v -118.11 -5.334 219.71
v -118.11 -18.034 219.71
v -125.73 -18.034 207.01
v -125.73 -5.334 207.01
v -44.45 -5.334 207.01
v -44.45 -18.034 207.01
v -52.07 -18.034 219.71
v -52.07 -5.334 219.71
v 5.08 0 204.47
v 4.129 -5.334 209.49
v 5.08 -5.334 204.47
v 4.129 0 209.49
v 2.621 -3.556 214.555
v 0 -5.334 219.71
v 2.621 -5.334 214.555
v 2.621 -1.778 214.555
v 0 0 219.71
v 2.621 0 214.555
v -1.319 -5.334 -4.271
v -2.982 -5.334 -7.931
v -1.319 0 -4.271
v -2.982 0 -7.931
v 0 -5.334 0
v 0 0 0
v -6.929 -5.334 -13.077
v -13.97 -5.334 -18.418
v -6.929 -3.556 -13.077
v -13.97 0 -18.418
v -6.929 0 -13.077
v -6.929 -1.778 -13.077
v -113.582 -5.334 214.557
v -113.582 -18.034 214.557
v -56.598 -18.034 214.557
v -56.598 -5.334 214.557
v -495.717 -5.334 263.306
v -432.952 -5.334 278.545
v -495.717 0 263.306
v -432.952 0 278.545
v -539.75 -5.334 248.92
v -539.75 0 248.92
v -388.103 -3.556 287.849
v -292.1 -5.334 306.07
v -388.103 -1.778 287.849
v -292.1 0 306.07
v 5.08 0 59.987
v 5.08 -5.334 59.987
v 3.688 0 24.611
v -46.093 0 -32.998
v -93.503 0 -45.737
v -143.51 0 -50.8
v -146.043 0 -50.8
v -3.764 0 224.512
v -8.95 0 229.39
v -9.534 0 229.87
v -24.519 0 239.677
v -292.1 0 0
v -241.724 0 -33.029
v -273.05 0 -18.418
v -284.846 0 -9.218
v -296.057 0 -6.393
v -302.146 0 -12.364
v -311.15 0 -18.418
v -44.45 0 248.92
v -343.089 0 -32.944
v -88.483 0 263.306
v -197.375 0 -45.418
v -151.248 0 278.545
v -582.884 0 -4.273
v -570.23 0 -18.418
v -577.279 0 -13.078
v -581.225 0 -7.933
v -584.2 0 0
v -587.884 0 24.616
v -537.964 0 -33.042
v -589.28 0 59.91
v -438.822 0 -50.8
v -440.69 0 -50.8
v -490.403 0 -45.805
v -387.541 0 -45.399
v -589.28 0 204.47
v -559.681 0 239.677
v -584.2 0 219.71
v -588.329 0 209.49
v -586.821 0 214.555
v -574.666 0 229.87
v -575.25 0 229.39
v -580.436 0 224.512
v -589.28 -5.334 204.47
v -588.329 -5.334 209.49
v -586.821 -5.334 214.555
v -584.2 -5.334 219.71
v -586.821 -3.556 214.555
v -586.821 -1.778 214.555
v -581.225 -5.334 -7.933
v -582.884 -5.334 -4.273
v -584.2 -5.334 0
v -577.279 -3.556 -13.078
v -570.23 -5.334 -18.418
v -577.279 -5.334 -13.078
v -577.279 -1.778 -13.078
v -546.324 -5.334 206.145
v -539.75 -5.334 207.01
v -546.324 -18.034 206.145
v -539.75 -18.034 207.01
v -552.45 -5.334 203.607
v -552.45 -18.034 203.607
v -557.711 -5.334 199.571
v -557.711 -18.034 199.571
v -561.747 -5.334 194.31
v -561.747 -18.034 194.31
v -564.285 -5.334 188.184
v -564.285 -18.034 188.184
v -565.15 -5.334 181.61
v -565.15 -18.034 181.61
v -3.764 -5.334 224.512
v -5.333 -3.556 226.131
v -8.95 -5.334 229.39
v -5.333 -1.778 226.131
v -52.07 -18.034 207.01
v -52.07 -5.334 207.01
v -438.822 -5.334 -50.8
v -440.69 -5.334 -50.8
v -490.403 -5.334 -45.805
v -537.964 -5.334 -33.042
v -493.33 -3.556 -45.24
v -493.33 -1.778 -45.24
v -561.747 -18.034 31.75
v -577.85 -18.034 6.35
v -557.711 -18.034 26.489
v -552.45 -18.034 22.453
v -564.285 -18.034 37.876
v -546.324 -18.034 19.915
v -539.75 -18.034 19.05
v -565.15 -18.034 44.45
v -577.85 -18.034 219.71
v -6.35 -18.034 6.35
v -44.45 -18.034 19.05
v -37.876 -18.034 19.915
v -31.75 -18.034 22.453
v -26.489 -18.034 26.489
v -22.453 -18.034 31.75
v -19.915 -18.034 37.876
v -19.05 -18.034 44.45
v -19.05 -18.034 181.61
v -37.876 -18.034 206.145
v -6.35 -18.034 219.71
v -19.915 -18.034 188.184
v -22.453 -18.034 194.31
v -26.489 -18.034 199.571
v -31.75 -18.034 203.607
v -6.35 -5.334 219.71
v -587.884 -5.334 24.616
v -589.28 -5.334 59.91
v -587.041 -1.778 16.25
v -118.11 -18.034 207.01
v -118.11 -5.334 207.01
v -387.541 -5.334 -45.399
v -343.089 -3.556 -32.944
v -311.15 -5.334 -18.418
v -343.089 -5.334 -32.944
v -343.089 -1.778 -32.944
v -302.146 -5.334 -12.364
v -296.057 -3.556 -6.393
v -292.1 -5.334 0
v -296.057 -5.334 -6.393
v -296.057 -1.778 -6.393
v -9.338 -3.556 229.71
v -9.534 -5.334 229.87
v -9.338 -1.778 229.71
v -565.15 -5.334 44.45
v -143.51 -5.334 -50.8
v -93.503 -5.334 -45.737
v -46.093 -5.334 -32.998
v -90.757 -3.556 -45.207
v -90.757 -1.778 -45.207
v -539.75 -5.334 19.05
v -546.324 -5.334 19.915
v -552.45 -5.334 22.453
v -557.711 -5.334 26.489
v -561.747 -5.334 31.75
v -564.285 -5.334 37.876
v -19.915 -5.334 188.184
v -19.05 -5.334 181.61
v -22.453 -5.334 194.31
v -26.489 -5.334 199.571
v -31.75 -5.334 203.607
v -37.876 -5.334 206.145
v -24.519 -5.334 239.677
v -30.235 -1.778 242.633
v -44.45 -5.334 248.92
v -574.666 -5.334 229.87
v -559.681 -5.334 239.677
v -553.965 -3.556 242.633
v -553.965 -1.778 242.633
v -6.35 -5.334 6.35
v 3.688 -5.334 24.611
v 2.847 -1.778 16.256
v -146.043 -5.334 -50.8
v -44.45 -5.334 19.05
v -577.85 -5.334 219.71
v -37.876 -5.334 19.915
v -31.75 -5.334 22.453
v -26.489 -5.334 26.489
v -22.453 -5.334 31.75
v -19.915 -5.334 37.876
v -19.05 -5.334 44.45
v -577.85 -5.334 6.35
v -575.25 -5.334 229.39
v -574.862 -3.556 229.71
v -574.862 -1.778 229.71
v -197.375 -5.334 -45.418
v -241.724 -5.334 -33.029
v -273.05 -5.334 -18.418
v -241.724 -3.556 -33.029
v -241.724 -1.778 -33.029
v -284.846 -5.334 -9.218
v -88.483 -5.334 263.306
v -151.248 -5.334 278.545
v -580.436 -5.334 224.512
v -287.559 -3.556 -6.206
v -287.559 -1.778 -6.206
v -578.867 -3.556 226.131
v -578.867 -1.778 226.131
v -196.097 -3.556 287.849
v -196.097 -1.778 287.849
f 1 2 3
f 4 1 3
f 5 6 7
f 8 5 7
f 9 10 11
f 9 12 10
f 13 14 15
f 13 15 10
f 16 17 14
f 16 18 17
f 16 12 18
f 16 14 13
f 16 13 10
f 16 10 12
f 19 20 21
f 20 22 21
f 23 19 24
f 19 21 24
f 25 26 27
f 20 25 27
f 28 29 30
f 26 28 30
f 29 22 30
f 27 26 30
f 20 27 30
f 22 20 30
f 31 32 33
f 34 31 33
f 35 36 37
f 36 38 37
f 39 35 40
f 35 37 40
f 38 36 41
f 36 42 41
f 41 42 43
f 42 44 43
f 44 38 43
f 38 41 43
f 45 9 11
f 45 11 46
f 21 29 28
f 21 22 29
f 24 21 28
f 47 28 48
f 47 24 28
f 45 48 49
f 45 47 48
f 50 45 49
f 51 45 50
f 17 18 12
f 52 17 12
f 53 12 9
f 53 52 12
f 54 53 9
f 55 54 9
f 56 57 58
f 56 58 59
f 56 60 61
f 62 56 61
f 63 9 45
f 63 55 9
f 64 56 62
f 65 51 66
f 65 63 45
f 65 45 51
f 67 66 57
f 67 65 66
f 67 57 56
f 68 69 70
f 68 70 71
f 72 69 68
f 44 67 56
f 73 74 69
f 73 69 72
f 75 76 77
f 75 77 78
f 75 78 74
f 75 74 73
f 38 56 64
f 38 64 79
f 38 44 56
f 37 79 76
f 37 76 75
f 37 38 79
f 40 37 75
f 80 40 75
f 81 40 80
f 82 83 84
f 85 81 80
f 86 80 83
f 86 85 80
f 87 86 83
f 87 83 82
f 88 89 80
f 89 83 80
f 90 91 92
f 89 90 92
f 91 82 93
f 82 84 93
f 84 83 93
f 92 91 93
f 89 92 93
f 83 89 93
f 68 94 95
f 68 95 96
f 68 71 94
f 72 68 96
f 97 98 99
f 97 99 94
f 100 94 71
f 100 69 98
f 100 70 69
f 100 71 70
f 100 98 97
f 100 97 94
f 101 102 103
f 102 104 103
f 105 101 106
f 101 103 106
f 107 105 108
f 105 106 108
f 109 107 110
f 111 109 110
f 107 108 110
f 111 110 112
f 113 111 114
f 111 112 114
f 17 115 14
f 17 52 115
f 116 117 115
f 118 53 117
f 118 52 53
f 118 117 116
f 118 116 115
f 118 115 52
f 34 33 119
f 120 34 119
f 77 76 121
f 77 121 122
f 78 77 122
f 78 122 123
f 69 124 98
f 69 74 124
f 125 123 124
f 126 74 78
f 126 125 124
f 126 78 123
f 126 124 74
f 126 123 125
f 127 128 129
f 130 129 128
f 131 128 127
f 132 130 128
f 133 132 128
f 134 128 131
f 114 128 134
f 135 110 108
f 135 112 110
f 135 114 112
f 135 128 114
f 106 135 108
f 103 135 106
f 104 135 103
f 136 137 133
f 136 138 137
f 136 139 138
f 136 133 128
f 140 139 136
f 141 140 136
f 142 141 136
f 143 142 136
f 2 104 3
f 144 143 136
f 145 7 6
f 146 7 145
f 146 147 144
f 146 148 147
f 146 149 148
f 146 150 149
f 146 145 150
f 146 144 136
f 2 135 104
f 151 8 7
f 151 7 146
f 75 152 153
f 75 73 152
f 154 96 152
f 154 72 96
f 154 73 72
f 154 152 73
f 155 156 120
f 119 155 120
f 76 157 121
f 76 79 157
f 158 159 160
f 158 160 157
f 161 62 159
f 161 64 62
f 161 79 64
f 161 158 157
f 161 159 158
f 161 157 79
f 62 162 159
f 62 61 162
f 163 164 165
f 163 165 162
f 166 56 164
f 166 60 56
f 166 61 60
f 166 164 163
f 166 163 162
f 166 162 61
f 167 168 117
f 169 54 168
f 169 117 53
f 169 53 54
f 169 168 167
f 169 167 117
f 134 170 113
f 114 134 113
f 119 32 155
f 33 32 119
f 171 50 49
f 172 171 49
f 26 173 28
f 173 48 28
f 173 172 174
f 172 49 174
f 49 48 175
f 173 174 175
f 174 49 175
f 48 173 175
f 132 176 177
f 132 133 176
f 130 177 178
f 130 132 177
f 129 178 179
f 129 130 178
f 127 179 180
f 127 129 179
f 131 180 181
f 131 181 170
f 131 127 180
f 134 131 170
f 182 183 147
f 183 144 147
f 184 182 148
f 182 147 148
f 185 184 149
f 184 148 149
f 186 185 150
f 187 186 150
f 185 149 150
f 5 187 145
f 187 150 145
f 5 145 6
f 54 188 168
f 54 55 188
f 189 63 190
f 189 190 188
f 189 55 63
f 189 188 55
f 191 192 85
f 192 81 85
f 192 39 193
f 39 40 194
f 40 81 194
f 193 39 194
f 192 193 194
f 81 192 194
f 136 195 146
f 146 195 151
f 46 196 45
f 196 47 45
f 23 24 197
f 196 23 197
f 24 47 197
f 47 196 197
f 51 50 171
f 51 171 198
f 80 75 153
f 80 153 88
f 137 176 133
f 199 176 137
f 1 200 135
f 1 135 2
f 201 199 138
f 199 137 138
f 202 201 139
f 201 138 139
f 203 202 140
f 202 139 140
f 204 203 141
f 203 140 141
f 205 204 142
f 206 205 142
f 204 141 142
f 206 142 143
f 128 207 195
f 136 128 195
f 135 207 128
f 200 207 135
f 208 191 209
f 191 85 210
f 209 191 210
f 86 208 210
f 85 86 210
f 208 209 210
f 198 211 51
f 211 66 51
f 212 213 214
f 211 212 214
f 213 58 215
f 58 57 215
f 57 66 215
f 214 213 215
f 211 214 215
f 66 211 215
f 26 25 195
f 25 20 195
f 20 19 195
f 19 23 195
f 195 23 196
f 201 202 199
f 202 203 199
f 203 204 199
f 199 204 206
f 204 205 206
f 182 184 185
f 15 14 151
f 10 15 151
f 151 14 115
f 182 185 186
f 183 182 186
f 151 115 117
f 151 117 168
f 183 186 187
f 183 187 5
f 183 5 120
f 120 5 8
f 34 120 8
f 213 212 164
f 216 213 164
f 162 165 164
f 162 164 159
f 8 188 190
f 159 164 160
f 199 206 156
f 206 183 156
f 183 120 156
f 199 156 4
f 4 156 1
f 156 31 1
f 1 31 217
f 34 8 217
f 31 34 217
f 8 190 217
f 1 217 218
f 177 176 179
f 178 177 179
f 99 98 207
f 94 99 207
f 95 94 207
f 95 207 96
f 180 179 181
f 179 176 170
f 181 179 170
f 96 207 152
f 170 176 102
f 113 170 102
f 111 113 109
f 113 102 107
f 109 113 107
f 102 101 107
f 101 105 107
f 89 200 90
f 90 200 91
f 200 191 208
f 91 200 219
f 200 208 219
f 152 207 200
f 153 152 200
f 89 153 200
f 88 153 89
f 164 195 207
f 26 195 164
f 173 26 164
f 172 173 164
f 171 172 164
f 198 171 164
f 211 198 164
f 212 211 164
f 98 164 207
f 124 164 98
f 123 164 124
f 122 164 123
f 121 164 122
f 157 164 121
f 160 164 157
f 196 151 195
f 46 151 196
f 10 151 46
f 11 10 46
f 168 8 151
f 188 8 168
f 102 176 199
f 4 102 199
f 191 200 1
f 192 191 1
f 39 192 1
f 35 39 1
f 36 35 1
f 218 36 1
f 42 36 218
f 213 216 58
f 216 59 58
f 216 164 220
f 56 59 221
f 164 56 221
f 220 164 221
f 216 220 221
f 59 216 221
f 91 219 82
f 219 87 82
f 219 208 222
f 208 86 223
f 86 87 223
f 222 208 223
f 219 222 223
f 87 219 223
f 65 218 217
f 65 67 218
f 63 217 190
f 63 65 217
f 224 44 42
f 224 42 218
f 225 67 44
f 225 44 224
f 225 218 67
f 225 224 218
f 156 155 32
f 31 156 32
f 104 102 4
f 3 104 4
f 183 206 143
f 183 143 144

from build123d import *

# Parameters (mm, degrees)
F0_W     = 584.2
F0_H     = 219.71
F1_DEPTH = 5.334
F2_W     = 571.5
F2_H     = 213.36
F2_W_2   = 546.1
F2_H_2   = 187.96
F3_DEPTH = 12.7
F4_R     = 25.4
F6_DEPTH = 12.7
F8_DEPTH = 5.334


# Not quite as in the source:
# - a feature names something its author has since deleted; it is built from what else it names


with BuildPart() as f1:
    # F0 (on Front) → F1 (new body)
    with BuildSketch(Plane.XZ):
        with Locations((-292.1, 109.855)):
            Rectangle(F0_W, F0_H)
    extrude(amount=F1_DEPTH)

    # F2 (on face) → F3 (join)
    with BuildSketch(Plane.XZ.offset(5.334)):
        with Locations((-292.1, 113.03)):
            Rectangle(F2_W, F2_H)
        with Locations((-292.1, 113.03)):
            Rectangle(F2_W_2, F2_H_2, mode=Mode.SUBTRACT)
    extrude(amount=F3_DEPTH)

    # F4
    f4_edges = [f1.edges().sort_by_distance(p)[0] for p in [
        (-565.15, -11.684, 207.01),
        (-19.05, -11.684, 207.01),
        (-19.05, -11.684, 19.05),
        (-565.15, -11.684, 19.05),
    ]]
    fillet(f4_edges, radius=F4_R)

    # F5 (on face) → F6 (cut)
    with BuildSketch(Plane.XZ.offset(18.034)):
        Polygon((-118.11, 219.71), (-125.73, 207.01), (-118.11, 207.01), (-113.5820166854, 214.5566388576), (-110.49, 219.71), align=None)
        Polygon((-56.5979833146, 214.5566388576), (-52.07, 207.01), (-44.45, 207.01), (-52.07, 219.71), (-59.69, 219.71), align=None)
        Polygon((-59.69, 219.71), (-110.49, 219.71), (-113.5820166854, 214.5566388576), (-56.5979833146, 214.5566388576), align=None)
    extrude(amount=-F6_DEPTH, mode=Mode.SUBTRACT)

    # F7 (on face) → F8 (join)
    with BuildSketch(Plane(origin=(0, 0, 0), x_dir=(-1, 0, 0), z_dir=(0, 1, 0))):
        with BuildLine():
            Line((292.1, 0), (0, 0))
            add(Edge.make_bspline(
                [(13.97, -18.4182160117), (5.1776683434, -12.9300591082), (2.1993531585, -8.4306227348), (0, 0)],
                knots=[0.6884256157, 0.6884256157, 0.6884256157, 0.6884256157, 0.8055577438, 0.8055577438, 0.8055577438, 0.8055577438], degree=3))
            Line((13.97, -18.4182160117), (273.05, -18.4182160117))
            add(Edge.make_bspline(
                [(292.1, 0), (287.8348745006, -6.4171904537), (283.3704909948, -12.0241872437), (273.05, -18.4182160117)],
                knots=[0, 0, 0, 0, 0.1254053332, 0.1254053332, 0.1254053332, 0.1254053332], degree=3))
        make_face()
        with BuildLine():
            add(Edge.make_bspline(
                [(0, 0), (-3.4777348873, 13.330951736), (-5.0077822241, 36.49129499), (-5.08, 59.9872617497)],
                knots=[0.8055577438, 0.8055577438, 0.8055577438, 0.8055577438, 0.9907733318, 0.9907733318, 0.9907733318, 0.9907733318], degree=3))
            Line((0, 0), (0, 109.855))
            Line((0, 109.855), (-5.08, 109.855))
            Line((-5.08, 109.855), (-5.08, 63.5))
            Line((-5.08, 63.5), (-5.08, 59.9872617497))
        make_face()
        with BuildLine():
            Line((273.05, -18.4182160117), (13.97, -18.4182160117))
            add(Edge.make_bspline(
                [(143.51, -50.8), (89.8146392781, -50.5091658601), (35.101098408, -31.6082079428), (13.97, -18.4182160117)],
                knots=[0.4069154744, 0.4069154744, 0.4069154744, 0.4069154744, 0.6884256157, 0.6884256157, 0.6884256157, 0.6884256157], degree=3))
            Line((143.51, -50.8), (146.0426574413, -50.8))
            add(Edge.make_bspline(
                [(273.05, -18.4182160117), (250.2469136161, -32.545798741), (198.8550496381, -50.5155722463), (146.0426574413, -50.8)],
                knots=[0.1254053332, 0.1254053332, 0.1254053332, 0.1254053332, 0.4024879494, 0.4024879494, 0.4024879494, 0.4024879494], degree=3))
        make_face()
        with BuildLine():
            Line((584.2, 0), (292.1, 0))
            add(Edge.make_bspline(
                [(292.1, 0), (295.2511238563, -6.7739107165), (300.4280406329, -12.1526213408), (311.15, -18.4182160117)],
                knots=[0, 0, 0, 0, 0.1254053332, 0.1254053332, 0.1254053332, 0.1254053332], degree=3))
            Line((311.15, -18.4182160117), (570.23, -18.4182160117))
            add(Edge.make_bspline(
                [(570.23, -18.4182160117), (579.0383616328, -12.9277742975), (582.0053728244, -8.4368679309), (584.2, 0)],
                knots=[0.6884256157, 0.6884256157, 0.6884256157, 0.6884256157, 0.8055577438, 0.8055577438, 0.8055577438, 0.8055577438], degree=3))
        make_face()
        with BuildLine():
            Line((-5.08, 109.855), (0, 109.855))
            Line((0, 109.855), (0, 219.71))
            add(Edge.make_bspline(
                [(0, 219.71), (-3.3633398359, 214.4958413315), (-4.221669918, 209.4829206658), (-5.08, 204.47)],
                knots=[0.8528806378, 0.8528806378, 0.8528806378, 0.8528806378, 1, 1, 1, 1], degree=3))
            Line((-5.08, 204.47), (-5.08, 109.855))
        make_face()
        with BuildLine():
            Line((570.23, -18.4182160117), (311.15, -18.4182160117))
            add(Edge.make_bspline(
                [(311.15, -18.4182160117), (334.9383025593, -32.3193936455), (386.0216290424, -50.5861863086), (438.8223695347, -50.8)],
                knots=[0.1254053332, 0.1254053332, 0.1254053332, 0.1254053332, 0.4036361962, 0.4036361962, 0.4036361962, 0.4036361962], degree=3))
            Line((438.8223695347, -50.8), (440.69, -50.8))
            add(Edge.make_bspline(
                [(440.69, -50.8), (494.1504250391, -50.5826159423), (549.0603758608, -31.6136991551), (570.23, -18.4182160117)],
                knots=[0.4069154744, 0.4069154744, 0.4069154744, 0.4069154744, 0.6884256157, 0.6884256157, 0.6884256157, 0.6884256157], degree=3))
        make_face()
        with BuildLine():
            Line((584.2, 109.855), (584.2, 0))
            add(Edge.make_bspline(
                [(584.2, 0), (587.6660611317, 13.3246778013), (589.2055548561, 36.4918183962), (589.28, 59.9101174948)],
                knots=[0.8055577438, 0.8055577438, 0.8055577438, 0.8055577438, 0.9905491269, 0.9905491269, 0.9905491269, 0.9905491269], degree=3))
            Line((589.28, 59.9101174948), (589.28, 63.5))
            Line((589.28, 63.5), (589.28, 109.855))
            Line((589.28, 109.855), (584.2, 109.855))
        make_face()
        with BuildLine():
            add(Edge.make_bspline(
                [(8.9497229668, 229.3903513516), (5.0117556013, 226.1203537614), (2.0435071593, 222.8780326962), (0, 219.71)],
                knots=[0.7634934559, 0.7634934559, 0.7634934559, 0.7634934559, 0.8528806378, 0.8528806378, 0.8528806378, 0.8528806378], degree=3))
            Line((0, 219.71), (292.1, 219.71))
            Line((292.1, 219.71), (8.9497229668, 229.3903513516))
        make_face()
        with BuildLine():
            Line((584.2, 219.71), (584.2, 109.855))
            Line((584.2, 109.855), (589.28, 109.855))
            Line((589.28, 109.855), (589.28, 204.47))
            add(Edge.make_bspline(
                [(584.2, 219.71), (587.5633398359, 214.4958413315), (588.421669918, 209.4829206658), (589.28, 204.47)],
                knots=[0.8528806378, 0.8528806378, 0.8528806378, 0.8528806378, 1, 1, 1, 1], degree=3))
        make_face()
        with BuildLine():
            add(Edge.make_bspline(
                [(9.5340725562, 229.87), (9.3369695017, 229.7100546344), (9.1421880555, 229.5501699377), (8.9497229668, 229.3903513516)],
                knots=[0.759124727, 0.759124727, 0.759124727, 0.759124727, 0.7634934559, 0.7634934559, 0.7634934559, 0.7634934559], degree=3))
            Line((8.9497229668, 229.3903513516), (292.1, 219.71))
            Line((292.1, 219.71), (575.2502770332, 229.3903513516))
            add(Edge.make_bspline(
                [(574.6659274438, 229.87), (574.8630304983, 229.7100546344), (575.0578119445, 229.5501699377), (575.2502770332, 229.3903513516)],
                knots=[0.759124727, 0.759124727, 0.759124727, 0.759124727, 0.7634934559, 0.7634934559, 0.7634934559, 0.7634934559], degree=3))
            Line((574.6659274438, 229.87), (539.75, 229.87))
            Line((539.75, 229.87), (292.1, 229.87))
            Line((292.1, 229.87), (44.45, 229.87))
            Line((44.45, 229.87), (9.5340725562, 229.87))
        make_face()
        with BuildLine():
            Line((575.2502770332, 229.3903513516), (292.1, 219.71))
            Line((292.1, 219.71), (584.2, 219.71))
            add(Edge.make_bspline(
                [(575.2502770332, 229.3903513516), (579.1882443987, 226.1203537614), (582.1564928407, 222.8780326962), (584.2, 219.71)],
                knots=[0.7634934559, 0.7634934559, 0.7634934559, 0.7634934559, 0.8528806378, 0.8528806378, 0.8528806378, 0.8528806378], degree=3))
        make_face()
        with BuildLine():
            add(Edge.make_bspline(
                [(44.45, 248.92), (28.9100061464, 242.7028057711), (17.3818410687, 236.2383143168), (9.5340725562, 229.87)],
                knots=[0.5851813382, 0.5851813382, 0.5851813382, 0.5851813382, 0.759124727, 0.759124727, 0.759124727, 0.759124727], degree=3))
            Line((9.5340725562, 229.87), (44.45, 229.87))
            Line((44.45, 229.87), (44.45, 248.92))
        make_face()
        with BuildLine():
            Line((44.45, 248.92), (44.45, 229.87))
            Line((44.45, 229.87), (292.1, 229.87))
            Line((292.1, 229.87), (292.1, 306.07))
            add(Edge.make_bspline(
                [(292.1, 306.07), (194.4148678752, 287.9529601014), (96.7297357504, 269.8359202028), (44.45, 248.92)],
                knots=[0, 0, 0, 0, 0.5851813382, 0.5851813382, 0.5851813382, 0.5851813382], degree=3))
        make_face()
        with BuildLine():
            Line((539.75, 229.87), (574.6659274438, 229.87))
            add(Edge.make_bspline(
                [(539.75, 248.92), (555.2899938536, 242.7028057711), (566.8181589313, 236.2383143168), (574.6659274438, 229.87)],
                knots=[0.5851813382, 0.5851813382, 0.5851813382, 0.5851813382, 0.759124727, 0.759124727, 0.759124727, 0.759124727], degree=3))
            Line((539.75, 248.92), (539.75, 229.87))
        make_face()
        with BuildLine():
            Line((292.1, 306.07), (292.1, 229.87))
            Line((292.1, 229.87), (539.75, 229.87))
            Line((539.75, 229.87), (539.75, 248.92))
            add(Edge.make_bspline(
                [(292.1, 306.07), (389.7851321248, 287.9529601014), (487.4702642496, 269.8359202028), (539.75, 248.92)],
                knots=[0, 0, 0, 0, 0.5851813382, 0.5851813382, 0.5851813382, 0.5851813382], degree=3))
        make_face()
    extrude(amount=-F8_DEPTH)


solid = f1.part
